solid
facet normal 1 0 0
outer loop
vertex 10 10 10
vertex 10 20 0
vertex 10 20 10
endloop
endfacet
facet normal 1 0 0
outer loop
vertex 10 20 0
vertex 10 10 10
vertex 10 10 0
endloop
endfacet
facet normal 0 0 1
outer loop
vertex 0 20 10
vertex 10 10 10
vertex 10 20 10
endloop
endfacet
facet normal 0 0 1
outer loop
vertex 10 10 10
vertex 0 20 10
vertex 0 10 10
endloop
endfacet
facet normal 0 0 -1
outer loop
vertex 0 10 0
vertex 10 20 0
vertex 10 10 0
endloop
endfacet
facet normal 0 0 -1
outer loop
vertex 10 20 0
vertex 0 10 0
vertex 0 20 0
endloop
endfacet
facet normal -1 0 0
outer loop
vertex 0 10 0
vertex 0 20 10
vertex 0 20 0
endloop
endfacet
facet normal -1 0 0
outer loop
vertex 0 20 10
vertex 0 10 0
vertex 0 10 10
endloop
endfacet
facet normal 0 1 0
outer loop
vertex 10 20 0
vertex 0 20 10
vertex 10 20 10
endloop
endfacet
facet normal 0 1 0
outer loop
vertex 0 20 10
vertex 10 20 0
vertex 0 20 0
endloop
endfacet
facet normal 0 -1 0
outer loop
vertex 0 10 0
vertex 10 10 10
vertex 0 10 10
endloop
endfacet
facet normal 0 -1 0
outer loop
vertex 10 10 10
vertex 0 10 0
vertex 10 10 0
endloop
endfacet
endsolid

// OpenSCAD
/*
 * Welcome to the Advent Calendar - Tutorial Edition - Part 05
 */

// In part 4, we saw how to combine geometry. With more complex models
// it sometimes can get difficult to see where specific geometry appears
// in the model.

step = 1; // [1:8]

/*** STEP 1 ***/

// Consider this example which is supposed to be a cube with a horizontal
// hole. But it appears to not work at all, only showing the cube.

if (step == 1) {

difference() {
	translate([0, 10, 0]) cube(10);
	translate([5, 9, 5]) rotate([90, 0, 0]) cylinder(r = 3, h = 12);
}

}

/*** STEP 2 ***/

// Using the # modifier infront of geometry will highlight it is
// transparent red, even if it is subtracted from somewhere.  With that
// modifier added, we can see the cylinder ended up in the wrong place. We
// can fix the issue by changing the rotation from 90 degrees around
// the X axis to -90 degrees.

// => Change the value of the rotation and preview (F5) again.

// With the rotation corrected, the cylinder correctly shows up in the
// middle of the cube, still highlighted.

// => Run the render step (F6), that now shows the model as it is supposed
// to look like. The highlight only happens in preview.

if (step == 2) {

difference() {
	translate([0, 10, 0]) cube(10);
	#translate([5, 9, 5]) rotate([-90, 0, 0]) cylinder(r = 3, h = 12);
}

}

/*** STEP 3 ***/

// Once satisfied with the model, we can remove the modifier again and
// the preview is showing the model as expected.

if (step == 3) {

difference() {
	translate([0, 10, 0]) cube(10);
	translate([5, 9, 5]) rotate([-90, 0, 0]) cylinder(r = 3, h = 12);
}

}

/*** STEP 4 ***/

// Another way if focusing on detail of a model is using the ! modifier
// that will cause only the marked geometry to be shown. In our example
// we have a simple box with a sphere mostly hidden inside.

if (step == 4) {

difference() {
	translate([0, 0, 3]) cube([20, 20, 10]);
	translate([1, 1, 2]) cube([18, 18, 10]);
}

union() {
	cube([20, 20, 1]);
	translate([1, 1, 0]) cube([18, 18, 2]);
	translate([10, 10, 3]) sphere(3);
}

}

/*** STEP 5 ***/

// Adding the ! modifier infront of the union() will keep only this
// geometry, skipping all the other declared geometry even though it's
// unchanged in the file.

if (step == 5) {

difference() {
	translate([0, 0, 3]) cube([20, 20, 10]);
	translate([1, 1, 2]) cube([18, 18, 10]);
}

!union() {
	cube([20, 20, 1]);
	translate([1, 1, 0]) cube([18, 18, 2]);
	translate([10, 10, 3]) sphere(3);
}

}

/*** STEP 6 ***/

// The third modifier is %. This can be used to add some informational
// geometry that will show up in the preview as transparent gray but
// will not get added to the final model.

// => Preview (F5) shows the small cubes at the corners of the model

// => Render (F6) shows only the first cuboid of the model

if (step == 6) {

cube([20, 20, 1]);

%union() {
	cube(2);
	translate([ 0, 18, 0]) cube(2);
	translate([18,  0, 0]) cube(2);
	translate([18, 18, 0]) cube(2);
}

}

/*** STEP 7 ***/

// The fourth and last modifier is * which acts as a structure aware
// comment and will comment out the whole section of statements it is
// marking. So by just adding the * infront of the difference, it will
// remove the whole content of that code block regardless of the number
// of lines it spans.

if (step == 7) {

cylinder(r = 4, h = 4);

*difference() {
	translate([0, 10, 0]) cube(10);
	translate([5, 9, 5]) rotate([-90, 0, 0]) cylinder(r = 3, h = 12);
}

}

/*** STEP 8 ***/

// Another important topic when generating models is the resolution the
// mesh will be generated with. OpenSCAD using mesh output means that
// the output files can't represent ideal circles or spheres.

// The mesh resolution is controlled by special variables $fa, $fs
// and $fn.

// All 3 variables control a different way of defining resolution
// $fa = angular resolution in degrees
// $fs = segment resolution in OpenSCAD units
// $fn = fixed number of subdivision

// In general, it's advisable to use $fa and $fs as those scale with
// the objects generated, where $fn can cause a resolution too low for
// big objects, but much too high for small ones.

// The values for those variables can be given in almost all places
// affecting the part of the design generated at this point.

// The higher the resolution for mesh generation is set, the longer it
// will take to render the mesh, so keeping a reasonable low resolution
// is key for working efficiently. Usually it's better to look for the
// needed output resolution, e.g. for 3D printing and not trying to make
// the preview look perfect.

// Default values for $fa and $fs, can easily be set at the beginning of
// the main file. Those will affect all places that do not specifically
// override the values.

if (step == 8) {

// fixed number of segments, regardless of size
translate([-3, 0, 5]) rotate([90, 0, 0])
	cylinder(r = 5, h = 1, $fn = 5);

// $fa takes precedens as it allows fewer subdivisions than $fs
// Angular resolution of 60 degress means we are getting a hexagon
translate([9, 0, 5]) rotate([90, 0, 0])
	cylinder(r = 5, h = 1, $fa = 60, $fs = 0.1);

// $fs takes precedens as it allows fewer subdivisions than $fa
// Segment length is calculated as: s = ceil(r * 2 * PI / $fs) so with
// a radius of 5, the circumference of the circle is ~31.42, dividing
// by our $fs value of 5, we get ~6.3 and therefor 7 segments.
translate([21, 0, 5]) rotate([90, 0, 0])
	cylinder(r = 5, h = 1, $fa = 1, $fs = 5);

}

/*** THE END ***/

// More details on the modifiers can be found in the user manual at
// https://en.wikibooks.org/wiki/OpenSCAD_User_Manual/Modifier_Characters

/*********************************************************************/

// Written in 2024 by Torsten Paul <Torsten.Paul@gmx.de>
//
// To the extent possible under law, the author(s) have dedicated all
// copyright and related and neighboring rights to this software to the
// public domain worldwide. This software is distributed without any
// warranty.
//
// You should have received a copy of the CC0 Public Domain
// Dedication along with this software.
// If not, see <http://creativecommons.org/publicdomain/zero/1.0/>.

$fa = 1; $fs = 0.2;
